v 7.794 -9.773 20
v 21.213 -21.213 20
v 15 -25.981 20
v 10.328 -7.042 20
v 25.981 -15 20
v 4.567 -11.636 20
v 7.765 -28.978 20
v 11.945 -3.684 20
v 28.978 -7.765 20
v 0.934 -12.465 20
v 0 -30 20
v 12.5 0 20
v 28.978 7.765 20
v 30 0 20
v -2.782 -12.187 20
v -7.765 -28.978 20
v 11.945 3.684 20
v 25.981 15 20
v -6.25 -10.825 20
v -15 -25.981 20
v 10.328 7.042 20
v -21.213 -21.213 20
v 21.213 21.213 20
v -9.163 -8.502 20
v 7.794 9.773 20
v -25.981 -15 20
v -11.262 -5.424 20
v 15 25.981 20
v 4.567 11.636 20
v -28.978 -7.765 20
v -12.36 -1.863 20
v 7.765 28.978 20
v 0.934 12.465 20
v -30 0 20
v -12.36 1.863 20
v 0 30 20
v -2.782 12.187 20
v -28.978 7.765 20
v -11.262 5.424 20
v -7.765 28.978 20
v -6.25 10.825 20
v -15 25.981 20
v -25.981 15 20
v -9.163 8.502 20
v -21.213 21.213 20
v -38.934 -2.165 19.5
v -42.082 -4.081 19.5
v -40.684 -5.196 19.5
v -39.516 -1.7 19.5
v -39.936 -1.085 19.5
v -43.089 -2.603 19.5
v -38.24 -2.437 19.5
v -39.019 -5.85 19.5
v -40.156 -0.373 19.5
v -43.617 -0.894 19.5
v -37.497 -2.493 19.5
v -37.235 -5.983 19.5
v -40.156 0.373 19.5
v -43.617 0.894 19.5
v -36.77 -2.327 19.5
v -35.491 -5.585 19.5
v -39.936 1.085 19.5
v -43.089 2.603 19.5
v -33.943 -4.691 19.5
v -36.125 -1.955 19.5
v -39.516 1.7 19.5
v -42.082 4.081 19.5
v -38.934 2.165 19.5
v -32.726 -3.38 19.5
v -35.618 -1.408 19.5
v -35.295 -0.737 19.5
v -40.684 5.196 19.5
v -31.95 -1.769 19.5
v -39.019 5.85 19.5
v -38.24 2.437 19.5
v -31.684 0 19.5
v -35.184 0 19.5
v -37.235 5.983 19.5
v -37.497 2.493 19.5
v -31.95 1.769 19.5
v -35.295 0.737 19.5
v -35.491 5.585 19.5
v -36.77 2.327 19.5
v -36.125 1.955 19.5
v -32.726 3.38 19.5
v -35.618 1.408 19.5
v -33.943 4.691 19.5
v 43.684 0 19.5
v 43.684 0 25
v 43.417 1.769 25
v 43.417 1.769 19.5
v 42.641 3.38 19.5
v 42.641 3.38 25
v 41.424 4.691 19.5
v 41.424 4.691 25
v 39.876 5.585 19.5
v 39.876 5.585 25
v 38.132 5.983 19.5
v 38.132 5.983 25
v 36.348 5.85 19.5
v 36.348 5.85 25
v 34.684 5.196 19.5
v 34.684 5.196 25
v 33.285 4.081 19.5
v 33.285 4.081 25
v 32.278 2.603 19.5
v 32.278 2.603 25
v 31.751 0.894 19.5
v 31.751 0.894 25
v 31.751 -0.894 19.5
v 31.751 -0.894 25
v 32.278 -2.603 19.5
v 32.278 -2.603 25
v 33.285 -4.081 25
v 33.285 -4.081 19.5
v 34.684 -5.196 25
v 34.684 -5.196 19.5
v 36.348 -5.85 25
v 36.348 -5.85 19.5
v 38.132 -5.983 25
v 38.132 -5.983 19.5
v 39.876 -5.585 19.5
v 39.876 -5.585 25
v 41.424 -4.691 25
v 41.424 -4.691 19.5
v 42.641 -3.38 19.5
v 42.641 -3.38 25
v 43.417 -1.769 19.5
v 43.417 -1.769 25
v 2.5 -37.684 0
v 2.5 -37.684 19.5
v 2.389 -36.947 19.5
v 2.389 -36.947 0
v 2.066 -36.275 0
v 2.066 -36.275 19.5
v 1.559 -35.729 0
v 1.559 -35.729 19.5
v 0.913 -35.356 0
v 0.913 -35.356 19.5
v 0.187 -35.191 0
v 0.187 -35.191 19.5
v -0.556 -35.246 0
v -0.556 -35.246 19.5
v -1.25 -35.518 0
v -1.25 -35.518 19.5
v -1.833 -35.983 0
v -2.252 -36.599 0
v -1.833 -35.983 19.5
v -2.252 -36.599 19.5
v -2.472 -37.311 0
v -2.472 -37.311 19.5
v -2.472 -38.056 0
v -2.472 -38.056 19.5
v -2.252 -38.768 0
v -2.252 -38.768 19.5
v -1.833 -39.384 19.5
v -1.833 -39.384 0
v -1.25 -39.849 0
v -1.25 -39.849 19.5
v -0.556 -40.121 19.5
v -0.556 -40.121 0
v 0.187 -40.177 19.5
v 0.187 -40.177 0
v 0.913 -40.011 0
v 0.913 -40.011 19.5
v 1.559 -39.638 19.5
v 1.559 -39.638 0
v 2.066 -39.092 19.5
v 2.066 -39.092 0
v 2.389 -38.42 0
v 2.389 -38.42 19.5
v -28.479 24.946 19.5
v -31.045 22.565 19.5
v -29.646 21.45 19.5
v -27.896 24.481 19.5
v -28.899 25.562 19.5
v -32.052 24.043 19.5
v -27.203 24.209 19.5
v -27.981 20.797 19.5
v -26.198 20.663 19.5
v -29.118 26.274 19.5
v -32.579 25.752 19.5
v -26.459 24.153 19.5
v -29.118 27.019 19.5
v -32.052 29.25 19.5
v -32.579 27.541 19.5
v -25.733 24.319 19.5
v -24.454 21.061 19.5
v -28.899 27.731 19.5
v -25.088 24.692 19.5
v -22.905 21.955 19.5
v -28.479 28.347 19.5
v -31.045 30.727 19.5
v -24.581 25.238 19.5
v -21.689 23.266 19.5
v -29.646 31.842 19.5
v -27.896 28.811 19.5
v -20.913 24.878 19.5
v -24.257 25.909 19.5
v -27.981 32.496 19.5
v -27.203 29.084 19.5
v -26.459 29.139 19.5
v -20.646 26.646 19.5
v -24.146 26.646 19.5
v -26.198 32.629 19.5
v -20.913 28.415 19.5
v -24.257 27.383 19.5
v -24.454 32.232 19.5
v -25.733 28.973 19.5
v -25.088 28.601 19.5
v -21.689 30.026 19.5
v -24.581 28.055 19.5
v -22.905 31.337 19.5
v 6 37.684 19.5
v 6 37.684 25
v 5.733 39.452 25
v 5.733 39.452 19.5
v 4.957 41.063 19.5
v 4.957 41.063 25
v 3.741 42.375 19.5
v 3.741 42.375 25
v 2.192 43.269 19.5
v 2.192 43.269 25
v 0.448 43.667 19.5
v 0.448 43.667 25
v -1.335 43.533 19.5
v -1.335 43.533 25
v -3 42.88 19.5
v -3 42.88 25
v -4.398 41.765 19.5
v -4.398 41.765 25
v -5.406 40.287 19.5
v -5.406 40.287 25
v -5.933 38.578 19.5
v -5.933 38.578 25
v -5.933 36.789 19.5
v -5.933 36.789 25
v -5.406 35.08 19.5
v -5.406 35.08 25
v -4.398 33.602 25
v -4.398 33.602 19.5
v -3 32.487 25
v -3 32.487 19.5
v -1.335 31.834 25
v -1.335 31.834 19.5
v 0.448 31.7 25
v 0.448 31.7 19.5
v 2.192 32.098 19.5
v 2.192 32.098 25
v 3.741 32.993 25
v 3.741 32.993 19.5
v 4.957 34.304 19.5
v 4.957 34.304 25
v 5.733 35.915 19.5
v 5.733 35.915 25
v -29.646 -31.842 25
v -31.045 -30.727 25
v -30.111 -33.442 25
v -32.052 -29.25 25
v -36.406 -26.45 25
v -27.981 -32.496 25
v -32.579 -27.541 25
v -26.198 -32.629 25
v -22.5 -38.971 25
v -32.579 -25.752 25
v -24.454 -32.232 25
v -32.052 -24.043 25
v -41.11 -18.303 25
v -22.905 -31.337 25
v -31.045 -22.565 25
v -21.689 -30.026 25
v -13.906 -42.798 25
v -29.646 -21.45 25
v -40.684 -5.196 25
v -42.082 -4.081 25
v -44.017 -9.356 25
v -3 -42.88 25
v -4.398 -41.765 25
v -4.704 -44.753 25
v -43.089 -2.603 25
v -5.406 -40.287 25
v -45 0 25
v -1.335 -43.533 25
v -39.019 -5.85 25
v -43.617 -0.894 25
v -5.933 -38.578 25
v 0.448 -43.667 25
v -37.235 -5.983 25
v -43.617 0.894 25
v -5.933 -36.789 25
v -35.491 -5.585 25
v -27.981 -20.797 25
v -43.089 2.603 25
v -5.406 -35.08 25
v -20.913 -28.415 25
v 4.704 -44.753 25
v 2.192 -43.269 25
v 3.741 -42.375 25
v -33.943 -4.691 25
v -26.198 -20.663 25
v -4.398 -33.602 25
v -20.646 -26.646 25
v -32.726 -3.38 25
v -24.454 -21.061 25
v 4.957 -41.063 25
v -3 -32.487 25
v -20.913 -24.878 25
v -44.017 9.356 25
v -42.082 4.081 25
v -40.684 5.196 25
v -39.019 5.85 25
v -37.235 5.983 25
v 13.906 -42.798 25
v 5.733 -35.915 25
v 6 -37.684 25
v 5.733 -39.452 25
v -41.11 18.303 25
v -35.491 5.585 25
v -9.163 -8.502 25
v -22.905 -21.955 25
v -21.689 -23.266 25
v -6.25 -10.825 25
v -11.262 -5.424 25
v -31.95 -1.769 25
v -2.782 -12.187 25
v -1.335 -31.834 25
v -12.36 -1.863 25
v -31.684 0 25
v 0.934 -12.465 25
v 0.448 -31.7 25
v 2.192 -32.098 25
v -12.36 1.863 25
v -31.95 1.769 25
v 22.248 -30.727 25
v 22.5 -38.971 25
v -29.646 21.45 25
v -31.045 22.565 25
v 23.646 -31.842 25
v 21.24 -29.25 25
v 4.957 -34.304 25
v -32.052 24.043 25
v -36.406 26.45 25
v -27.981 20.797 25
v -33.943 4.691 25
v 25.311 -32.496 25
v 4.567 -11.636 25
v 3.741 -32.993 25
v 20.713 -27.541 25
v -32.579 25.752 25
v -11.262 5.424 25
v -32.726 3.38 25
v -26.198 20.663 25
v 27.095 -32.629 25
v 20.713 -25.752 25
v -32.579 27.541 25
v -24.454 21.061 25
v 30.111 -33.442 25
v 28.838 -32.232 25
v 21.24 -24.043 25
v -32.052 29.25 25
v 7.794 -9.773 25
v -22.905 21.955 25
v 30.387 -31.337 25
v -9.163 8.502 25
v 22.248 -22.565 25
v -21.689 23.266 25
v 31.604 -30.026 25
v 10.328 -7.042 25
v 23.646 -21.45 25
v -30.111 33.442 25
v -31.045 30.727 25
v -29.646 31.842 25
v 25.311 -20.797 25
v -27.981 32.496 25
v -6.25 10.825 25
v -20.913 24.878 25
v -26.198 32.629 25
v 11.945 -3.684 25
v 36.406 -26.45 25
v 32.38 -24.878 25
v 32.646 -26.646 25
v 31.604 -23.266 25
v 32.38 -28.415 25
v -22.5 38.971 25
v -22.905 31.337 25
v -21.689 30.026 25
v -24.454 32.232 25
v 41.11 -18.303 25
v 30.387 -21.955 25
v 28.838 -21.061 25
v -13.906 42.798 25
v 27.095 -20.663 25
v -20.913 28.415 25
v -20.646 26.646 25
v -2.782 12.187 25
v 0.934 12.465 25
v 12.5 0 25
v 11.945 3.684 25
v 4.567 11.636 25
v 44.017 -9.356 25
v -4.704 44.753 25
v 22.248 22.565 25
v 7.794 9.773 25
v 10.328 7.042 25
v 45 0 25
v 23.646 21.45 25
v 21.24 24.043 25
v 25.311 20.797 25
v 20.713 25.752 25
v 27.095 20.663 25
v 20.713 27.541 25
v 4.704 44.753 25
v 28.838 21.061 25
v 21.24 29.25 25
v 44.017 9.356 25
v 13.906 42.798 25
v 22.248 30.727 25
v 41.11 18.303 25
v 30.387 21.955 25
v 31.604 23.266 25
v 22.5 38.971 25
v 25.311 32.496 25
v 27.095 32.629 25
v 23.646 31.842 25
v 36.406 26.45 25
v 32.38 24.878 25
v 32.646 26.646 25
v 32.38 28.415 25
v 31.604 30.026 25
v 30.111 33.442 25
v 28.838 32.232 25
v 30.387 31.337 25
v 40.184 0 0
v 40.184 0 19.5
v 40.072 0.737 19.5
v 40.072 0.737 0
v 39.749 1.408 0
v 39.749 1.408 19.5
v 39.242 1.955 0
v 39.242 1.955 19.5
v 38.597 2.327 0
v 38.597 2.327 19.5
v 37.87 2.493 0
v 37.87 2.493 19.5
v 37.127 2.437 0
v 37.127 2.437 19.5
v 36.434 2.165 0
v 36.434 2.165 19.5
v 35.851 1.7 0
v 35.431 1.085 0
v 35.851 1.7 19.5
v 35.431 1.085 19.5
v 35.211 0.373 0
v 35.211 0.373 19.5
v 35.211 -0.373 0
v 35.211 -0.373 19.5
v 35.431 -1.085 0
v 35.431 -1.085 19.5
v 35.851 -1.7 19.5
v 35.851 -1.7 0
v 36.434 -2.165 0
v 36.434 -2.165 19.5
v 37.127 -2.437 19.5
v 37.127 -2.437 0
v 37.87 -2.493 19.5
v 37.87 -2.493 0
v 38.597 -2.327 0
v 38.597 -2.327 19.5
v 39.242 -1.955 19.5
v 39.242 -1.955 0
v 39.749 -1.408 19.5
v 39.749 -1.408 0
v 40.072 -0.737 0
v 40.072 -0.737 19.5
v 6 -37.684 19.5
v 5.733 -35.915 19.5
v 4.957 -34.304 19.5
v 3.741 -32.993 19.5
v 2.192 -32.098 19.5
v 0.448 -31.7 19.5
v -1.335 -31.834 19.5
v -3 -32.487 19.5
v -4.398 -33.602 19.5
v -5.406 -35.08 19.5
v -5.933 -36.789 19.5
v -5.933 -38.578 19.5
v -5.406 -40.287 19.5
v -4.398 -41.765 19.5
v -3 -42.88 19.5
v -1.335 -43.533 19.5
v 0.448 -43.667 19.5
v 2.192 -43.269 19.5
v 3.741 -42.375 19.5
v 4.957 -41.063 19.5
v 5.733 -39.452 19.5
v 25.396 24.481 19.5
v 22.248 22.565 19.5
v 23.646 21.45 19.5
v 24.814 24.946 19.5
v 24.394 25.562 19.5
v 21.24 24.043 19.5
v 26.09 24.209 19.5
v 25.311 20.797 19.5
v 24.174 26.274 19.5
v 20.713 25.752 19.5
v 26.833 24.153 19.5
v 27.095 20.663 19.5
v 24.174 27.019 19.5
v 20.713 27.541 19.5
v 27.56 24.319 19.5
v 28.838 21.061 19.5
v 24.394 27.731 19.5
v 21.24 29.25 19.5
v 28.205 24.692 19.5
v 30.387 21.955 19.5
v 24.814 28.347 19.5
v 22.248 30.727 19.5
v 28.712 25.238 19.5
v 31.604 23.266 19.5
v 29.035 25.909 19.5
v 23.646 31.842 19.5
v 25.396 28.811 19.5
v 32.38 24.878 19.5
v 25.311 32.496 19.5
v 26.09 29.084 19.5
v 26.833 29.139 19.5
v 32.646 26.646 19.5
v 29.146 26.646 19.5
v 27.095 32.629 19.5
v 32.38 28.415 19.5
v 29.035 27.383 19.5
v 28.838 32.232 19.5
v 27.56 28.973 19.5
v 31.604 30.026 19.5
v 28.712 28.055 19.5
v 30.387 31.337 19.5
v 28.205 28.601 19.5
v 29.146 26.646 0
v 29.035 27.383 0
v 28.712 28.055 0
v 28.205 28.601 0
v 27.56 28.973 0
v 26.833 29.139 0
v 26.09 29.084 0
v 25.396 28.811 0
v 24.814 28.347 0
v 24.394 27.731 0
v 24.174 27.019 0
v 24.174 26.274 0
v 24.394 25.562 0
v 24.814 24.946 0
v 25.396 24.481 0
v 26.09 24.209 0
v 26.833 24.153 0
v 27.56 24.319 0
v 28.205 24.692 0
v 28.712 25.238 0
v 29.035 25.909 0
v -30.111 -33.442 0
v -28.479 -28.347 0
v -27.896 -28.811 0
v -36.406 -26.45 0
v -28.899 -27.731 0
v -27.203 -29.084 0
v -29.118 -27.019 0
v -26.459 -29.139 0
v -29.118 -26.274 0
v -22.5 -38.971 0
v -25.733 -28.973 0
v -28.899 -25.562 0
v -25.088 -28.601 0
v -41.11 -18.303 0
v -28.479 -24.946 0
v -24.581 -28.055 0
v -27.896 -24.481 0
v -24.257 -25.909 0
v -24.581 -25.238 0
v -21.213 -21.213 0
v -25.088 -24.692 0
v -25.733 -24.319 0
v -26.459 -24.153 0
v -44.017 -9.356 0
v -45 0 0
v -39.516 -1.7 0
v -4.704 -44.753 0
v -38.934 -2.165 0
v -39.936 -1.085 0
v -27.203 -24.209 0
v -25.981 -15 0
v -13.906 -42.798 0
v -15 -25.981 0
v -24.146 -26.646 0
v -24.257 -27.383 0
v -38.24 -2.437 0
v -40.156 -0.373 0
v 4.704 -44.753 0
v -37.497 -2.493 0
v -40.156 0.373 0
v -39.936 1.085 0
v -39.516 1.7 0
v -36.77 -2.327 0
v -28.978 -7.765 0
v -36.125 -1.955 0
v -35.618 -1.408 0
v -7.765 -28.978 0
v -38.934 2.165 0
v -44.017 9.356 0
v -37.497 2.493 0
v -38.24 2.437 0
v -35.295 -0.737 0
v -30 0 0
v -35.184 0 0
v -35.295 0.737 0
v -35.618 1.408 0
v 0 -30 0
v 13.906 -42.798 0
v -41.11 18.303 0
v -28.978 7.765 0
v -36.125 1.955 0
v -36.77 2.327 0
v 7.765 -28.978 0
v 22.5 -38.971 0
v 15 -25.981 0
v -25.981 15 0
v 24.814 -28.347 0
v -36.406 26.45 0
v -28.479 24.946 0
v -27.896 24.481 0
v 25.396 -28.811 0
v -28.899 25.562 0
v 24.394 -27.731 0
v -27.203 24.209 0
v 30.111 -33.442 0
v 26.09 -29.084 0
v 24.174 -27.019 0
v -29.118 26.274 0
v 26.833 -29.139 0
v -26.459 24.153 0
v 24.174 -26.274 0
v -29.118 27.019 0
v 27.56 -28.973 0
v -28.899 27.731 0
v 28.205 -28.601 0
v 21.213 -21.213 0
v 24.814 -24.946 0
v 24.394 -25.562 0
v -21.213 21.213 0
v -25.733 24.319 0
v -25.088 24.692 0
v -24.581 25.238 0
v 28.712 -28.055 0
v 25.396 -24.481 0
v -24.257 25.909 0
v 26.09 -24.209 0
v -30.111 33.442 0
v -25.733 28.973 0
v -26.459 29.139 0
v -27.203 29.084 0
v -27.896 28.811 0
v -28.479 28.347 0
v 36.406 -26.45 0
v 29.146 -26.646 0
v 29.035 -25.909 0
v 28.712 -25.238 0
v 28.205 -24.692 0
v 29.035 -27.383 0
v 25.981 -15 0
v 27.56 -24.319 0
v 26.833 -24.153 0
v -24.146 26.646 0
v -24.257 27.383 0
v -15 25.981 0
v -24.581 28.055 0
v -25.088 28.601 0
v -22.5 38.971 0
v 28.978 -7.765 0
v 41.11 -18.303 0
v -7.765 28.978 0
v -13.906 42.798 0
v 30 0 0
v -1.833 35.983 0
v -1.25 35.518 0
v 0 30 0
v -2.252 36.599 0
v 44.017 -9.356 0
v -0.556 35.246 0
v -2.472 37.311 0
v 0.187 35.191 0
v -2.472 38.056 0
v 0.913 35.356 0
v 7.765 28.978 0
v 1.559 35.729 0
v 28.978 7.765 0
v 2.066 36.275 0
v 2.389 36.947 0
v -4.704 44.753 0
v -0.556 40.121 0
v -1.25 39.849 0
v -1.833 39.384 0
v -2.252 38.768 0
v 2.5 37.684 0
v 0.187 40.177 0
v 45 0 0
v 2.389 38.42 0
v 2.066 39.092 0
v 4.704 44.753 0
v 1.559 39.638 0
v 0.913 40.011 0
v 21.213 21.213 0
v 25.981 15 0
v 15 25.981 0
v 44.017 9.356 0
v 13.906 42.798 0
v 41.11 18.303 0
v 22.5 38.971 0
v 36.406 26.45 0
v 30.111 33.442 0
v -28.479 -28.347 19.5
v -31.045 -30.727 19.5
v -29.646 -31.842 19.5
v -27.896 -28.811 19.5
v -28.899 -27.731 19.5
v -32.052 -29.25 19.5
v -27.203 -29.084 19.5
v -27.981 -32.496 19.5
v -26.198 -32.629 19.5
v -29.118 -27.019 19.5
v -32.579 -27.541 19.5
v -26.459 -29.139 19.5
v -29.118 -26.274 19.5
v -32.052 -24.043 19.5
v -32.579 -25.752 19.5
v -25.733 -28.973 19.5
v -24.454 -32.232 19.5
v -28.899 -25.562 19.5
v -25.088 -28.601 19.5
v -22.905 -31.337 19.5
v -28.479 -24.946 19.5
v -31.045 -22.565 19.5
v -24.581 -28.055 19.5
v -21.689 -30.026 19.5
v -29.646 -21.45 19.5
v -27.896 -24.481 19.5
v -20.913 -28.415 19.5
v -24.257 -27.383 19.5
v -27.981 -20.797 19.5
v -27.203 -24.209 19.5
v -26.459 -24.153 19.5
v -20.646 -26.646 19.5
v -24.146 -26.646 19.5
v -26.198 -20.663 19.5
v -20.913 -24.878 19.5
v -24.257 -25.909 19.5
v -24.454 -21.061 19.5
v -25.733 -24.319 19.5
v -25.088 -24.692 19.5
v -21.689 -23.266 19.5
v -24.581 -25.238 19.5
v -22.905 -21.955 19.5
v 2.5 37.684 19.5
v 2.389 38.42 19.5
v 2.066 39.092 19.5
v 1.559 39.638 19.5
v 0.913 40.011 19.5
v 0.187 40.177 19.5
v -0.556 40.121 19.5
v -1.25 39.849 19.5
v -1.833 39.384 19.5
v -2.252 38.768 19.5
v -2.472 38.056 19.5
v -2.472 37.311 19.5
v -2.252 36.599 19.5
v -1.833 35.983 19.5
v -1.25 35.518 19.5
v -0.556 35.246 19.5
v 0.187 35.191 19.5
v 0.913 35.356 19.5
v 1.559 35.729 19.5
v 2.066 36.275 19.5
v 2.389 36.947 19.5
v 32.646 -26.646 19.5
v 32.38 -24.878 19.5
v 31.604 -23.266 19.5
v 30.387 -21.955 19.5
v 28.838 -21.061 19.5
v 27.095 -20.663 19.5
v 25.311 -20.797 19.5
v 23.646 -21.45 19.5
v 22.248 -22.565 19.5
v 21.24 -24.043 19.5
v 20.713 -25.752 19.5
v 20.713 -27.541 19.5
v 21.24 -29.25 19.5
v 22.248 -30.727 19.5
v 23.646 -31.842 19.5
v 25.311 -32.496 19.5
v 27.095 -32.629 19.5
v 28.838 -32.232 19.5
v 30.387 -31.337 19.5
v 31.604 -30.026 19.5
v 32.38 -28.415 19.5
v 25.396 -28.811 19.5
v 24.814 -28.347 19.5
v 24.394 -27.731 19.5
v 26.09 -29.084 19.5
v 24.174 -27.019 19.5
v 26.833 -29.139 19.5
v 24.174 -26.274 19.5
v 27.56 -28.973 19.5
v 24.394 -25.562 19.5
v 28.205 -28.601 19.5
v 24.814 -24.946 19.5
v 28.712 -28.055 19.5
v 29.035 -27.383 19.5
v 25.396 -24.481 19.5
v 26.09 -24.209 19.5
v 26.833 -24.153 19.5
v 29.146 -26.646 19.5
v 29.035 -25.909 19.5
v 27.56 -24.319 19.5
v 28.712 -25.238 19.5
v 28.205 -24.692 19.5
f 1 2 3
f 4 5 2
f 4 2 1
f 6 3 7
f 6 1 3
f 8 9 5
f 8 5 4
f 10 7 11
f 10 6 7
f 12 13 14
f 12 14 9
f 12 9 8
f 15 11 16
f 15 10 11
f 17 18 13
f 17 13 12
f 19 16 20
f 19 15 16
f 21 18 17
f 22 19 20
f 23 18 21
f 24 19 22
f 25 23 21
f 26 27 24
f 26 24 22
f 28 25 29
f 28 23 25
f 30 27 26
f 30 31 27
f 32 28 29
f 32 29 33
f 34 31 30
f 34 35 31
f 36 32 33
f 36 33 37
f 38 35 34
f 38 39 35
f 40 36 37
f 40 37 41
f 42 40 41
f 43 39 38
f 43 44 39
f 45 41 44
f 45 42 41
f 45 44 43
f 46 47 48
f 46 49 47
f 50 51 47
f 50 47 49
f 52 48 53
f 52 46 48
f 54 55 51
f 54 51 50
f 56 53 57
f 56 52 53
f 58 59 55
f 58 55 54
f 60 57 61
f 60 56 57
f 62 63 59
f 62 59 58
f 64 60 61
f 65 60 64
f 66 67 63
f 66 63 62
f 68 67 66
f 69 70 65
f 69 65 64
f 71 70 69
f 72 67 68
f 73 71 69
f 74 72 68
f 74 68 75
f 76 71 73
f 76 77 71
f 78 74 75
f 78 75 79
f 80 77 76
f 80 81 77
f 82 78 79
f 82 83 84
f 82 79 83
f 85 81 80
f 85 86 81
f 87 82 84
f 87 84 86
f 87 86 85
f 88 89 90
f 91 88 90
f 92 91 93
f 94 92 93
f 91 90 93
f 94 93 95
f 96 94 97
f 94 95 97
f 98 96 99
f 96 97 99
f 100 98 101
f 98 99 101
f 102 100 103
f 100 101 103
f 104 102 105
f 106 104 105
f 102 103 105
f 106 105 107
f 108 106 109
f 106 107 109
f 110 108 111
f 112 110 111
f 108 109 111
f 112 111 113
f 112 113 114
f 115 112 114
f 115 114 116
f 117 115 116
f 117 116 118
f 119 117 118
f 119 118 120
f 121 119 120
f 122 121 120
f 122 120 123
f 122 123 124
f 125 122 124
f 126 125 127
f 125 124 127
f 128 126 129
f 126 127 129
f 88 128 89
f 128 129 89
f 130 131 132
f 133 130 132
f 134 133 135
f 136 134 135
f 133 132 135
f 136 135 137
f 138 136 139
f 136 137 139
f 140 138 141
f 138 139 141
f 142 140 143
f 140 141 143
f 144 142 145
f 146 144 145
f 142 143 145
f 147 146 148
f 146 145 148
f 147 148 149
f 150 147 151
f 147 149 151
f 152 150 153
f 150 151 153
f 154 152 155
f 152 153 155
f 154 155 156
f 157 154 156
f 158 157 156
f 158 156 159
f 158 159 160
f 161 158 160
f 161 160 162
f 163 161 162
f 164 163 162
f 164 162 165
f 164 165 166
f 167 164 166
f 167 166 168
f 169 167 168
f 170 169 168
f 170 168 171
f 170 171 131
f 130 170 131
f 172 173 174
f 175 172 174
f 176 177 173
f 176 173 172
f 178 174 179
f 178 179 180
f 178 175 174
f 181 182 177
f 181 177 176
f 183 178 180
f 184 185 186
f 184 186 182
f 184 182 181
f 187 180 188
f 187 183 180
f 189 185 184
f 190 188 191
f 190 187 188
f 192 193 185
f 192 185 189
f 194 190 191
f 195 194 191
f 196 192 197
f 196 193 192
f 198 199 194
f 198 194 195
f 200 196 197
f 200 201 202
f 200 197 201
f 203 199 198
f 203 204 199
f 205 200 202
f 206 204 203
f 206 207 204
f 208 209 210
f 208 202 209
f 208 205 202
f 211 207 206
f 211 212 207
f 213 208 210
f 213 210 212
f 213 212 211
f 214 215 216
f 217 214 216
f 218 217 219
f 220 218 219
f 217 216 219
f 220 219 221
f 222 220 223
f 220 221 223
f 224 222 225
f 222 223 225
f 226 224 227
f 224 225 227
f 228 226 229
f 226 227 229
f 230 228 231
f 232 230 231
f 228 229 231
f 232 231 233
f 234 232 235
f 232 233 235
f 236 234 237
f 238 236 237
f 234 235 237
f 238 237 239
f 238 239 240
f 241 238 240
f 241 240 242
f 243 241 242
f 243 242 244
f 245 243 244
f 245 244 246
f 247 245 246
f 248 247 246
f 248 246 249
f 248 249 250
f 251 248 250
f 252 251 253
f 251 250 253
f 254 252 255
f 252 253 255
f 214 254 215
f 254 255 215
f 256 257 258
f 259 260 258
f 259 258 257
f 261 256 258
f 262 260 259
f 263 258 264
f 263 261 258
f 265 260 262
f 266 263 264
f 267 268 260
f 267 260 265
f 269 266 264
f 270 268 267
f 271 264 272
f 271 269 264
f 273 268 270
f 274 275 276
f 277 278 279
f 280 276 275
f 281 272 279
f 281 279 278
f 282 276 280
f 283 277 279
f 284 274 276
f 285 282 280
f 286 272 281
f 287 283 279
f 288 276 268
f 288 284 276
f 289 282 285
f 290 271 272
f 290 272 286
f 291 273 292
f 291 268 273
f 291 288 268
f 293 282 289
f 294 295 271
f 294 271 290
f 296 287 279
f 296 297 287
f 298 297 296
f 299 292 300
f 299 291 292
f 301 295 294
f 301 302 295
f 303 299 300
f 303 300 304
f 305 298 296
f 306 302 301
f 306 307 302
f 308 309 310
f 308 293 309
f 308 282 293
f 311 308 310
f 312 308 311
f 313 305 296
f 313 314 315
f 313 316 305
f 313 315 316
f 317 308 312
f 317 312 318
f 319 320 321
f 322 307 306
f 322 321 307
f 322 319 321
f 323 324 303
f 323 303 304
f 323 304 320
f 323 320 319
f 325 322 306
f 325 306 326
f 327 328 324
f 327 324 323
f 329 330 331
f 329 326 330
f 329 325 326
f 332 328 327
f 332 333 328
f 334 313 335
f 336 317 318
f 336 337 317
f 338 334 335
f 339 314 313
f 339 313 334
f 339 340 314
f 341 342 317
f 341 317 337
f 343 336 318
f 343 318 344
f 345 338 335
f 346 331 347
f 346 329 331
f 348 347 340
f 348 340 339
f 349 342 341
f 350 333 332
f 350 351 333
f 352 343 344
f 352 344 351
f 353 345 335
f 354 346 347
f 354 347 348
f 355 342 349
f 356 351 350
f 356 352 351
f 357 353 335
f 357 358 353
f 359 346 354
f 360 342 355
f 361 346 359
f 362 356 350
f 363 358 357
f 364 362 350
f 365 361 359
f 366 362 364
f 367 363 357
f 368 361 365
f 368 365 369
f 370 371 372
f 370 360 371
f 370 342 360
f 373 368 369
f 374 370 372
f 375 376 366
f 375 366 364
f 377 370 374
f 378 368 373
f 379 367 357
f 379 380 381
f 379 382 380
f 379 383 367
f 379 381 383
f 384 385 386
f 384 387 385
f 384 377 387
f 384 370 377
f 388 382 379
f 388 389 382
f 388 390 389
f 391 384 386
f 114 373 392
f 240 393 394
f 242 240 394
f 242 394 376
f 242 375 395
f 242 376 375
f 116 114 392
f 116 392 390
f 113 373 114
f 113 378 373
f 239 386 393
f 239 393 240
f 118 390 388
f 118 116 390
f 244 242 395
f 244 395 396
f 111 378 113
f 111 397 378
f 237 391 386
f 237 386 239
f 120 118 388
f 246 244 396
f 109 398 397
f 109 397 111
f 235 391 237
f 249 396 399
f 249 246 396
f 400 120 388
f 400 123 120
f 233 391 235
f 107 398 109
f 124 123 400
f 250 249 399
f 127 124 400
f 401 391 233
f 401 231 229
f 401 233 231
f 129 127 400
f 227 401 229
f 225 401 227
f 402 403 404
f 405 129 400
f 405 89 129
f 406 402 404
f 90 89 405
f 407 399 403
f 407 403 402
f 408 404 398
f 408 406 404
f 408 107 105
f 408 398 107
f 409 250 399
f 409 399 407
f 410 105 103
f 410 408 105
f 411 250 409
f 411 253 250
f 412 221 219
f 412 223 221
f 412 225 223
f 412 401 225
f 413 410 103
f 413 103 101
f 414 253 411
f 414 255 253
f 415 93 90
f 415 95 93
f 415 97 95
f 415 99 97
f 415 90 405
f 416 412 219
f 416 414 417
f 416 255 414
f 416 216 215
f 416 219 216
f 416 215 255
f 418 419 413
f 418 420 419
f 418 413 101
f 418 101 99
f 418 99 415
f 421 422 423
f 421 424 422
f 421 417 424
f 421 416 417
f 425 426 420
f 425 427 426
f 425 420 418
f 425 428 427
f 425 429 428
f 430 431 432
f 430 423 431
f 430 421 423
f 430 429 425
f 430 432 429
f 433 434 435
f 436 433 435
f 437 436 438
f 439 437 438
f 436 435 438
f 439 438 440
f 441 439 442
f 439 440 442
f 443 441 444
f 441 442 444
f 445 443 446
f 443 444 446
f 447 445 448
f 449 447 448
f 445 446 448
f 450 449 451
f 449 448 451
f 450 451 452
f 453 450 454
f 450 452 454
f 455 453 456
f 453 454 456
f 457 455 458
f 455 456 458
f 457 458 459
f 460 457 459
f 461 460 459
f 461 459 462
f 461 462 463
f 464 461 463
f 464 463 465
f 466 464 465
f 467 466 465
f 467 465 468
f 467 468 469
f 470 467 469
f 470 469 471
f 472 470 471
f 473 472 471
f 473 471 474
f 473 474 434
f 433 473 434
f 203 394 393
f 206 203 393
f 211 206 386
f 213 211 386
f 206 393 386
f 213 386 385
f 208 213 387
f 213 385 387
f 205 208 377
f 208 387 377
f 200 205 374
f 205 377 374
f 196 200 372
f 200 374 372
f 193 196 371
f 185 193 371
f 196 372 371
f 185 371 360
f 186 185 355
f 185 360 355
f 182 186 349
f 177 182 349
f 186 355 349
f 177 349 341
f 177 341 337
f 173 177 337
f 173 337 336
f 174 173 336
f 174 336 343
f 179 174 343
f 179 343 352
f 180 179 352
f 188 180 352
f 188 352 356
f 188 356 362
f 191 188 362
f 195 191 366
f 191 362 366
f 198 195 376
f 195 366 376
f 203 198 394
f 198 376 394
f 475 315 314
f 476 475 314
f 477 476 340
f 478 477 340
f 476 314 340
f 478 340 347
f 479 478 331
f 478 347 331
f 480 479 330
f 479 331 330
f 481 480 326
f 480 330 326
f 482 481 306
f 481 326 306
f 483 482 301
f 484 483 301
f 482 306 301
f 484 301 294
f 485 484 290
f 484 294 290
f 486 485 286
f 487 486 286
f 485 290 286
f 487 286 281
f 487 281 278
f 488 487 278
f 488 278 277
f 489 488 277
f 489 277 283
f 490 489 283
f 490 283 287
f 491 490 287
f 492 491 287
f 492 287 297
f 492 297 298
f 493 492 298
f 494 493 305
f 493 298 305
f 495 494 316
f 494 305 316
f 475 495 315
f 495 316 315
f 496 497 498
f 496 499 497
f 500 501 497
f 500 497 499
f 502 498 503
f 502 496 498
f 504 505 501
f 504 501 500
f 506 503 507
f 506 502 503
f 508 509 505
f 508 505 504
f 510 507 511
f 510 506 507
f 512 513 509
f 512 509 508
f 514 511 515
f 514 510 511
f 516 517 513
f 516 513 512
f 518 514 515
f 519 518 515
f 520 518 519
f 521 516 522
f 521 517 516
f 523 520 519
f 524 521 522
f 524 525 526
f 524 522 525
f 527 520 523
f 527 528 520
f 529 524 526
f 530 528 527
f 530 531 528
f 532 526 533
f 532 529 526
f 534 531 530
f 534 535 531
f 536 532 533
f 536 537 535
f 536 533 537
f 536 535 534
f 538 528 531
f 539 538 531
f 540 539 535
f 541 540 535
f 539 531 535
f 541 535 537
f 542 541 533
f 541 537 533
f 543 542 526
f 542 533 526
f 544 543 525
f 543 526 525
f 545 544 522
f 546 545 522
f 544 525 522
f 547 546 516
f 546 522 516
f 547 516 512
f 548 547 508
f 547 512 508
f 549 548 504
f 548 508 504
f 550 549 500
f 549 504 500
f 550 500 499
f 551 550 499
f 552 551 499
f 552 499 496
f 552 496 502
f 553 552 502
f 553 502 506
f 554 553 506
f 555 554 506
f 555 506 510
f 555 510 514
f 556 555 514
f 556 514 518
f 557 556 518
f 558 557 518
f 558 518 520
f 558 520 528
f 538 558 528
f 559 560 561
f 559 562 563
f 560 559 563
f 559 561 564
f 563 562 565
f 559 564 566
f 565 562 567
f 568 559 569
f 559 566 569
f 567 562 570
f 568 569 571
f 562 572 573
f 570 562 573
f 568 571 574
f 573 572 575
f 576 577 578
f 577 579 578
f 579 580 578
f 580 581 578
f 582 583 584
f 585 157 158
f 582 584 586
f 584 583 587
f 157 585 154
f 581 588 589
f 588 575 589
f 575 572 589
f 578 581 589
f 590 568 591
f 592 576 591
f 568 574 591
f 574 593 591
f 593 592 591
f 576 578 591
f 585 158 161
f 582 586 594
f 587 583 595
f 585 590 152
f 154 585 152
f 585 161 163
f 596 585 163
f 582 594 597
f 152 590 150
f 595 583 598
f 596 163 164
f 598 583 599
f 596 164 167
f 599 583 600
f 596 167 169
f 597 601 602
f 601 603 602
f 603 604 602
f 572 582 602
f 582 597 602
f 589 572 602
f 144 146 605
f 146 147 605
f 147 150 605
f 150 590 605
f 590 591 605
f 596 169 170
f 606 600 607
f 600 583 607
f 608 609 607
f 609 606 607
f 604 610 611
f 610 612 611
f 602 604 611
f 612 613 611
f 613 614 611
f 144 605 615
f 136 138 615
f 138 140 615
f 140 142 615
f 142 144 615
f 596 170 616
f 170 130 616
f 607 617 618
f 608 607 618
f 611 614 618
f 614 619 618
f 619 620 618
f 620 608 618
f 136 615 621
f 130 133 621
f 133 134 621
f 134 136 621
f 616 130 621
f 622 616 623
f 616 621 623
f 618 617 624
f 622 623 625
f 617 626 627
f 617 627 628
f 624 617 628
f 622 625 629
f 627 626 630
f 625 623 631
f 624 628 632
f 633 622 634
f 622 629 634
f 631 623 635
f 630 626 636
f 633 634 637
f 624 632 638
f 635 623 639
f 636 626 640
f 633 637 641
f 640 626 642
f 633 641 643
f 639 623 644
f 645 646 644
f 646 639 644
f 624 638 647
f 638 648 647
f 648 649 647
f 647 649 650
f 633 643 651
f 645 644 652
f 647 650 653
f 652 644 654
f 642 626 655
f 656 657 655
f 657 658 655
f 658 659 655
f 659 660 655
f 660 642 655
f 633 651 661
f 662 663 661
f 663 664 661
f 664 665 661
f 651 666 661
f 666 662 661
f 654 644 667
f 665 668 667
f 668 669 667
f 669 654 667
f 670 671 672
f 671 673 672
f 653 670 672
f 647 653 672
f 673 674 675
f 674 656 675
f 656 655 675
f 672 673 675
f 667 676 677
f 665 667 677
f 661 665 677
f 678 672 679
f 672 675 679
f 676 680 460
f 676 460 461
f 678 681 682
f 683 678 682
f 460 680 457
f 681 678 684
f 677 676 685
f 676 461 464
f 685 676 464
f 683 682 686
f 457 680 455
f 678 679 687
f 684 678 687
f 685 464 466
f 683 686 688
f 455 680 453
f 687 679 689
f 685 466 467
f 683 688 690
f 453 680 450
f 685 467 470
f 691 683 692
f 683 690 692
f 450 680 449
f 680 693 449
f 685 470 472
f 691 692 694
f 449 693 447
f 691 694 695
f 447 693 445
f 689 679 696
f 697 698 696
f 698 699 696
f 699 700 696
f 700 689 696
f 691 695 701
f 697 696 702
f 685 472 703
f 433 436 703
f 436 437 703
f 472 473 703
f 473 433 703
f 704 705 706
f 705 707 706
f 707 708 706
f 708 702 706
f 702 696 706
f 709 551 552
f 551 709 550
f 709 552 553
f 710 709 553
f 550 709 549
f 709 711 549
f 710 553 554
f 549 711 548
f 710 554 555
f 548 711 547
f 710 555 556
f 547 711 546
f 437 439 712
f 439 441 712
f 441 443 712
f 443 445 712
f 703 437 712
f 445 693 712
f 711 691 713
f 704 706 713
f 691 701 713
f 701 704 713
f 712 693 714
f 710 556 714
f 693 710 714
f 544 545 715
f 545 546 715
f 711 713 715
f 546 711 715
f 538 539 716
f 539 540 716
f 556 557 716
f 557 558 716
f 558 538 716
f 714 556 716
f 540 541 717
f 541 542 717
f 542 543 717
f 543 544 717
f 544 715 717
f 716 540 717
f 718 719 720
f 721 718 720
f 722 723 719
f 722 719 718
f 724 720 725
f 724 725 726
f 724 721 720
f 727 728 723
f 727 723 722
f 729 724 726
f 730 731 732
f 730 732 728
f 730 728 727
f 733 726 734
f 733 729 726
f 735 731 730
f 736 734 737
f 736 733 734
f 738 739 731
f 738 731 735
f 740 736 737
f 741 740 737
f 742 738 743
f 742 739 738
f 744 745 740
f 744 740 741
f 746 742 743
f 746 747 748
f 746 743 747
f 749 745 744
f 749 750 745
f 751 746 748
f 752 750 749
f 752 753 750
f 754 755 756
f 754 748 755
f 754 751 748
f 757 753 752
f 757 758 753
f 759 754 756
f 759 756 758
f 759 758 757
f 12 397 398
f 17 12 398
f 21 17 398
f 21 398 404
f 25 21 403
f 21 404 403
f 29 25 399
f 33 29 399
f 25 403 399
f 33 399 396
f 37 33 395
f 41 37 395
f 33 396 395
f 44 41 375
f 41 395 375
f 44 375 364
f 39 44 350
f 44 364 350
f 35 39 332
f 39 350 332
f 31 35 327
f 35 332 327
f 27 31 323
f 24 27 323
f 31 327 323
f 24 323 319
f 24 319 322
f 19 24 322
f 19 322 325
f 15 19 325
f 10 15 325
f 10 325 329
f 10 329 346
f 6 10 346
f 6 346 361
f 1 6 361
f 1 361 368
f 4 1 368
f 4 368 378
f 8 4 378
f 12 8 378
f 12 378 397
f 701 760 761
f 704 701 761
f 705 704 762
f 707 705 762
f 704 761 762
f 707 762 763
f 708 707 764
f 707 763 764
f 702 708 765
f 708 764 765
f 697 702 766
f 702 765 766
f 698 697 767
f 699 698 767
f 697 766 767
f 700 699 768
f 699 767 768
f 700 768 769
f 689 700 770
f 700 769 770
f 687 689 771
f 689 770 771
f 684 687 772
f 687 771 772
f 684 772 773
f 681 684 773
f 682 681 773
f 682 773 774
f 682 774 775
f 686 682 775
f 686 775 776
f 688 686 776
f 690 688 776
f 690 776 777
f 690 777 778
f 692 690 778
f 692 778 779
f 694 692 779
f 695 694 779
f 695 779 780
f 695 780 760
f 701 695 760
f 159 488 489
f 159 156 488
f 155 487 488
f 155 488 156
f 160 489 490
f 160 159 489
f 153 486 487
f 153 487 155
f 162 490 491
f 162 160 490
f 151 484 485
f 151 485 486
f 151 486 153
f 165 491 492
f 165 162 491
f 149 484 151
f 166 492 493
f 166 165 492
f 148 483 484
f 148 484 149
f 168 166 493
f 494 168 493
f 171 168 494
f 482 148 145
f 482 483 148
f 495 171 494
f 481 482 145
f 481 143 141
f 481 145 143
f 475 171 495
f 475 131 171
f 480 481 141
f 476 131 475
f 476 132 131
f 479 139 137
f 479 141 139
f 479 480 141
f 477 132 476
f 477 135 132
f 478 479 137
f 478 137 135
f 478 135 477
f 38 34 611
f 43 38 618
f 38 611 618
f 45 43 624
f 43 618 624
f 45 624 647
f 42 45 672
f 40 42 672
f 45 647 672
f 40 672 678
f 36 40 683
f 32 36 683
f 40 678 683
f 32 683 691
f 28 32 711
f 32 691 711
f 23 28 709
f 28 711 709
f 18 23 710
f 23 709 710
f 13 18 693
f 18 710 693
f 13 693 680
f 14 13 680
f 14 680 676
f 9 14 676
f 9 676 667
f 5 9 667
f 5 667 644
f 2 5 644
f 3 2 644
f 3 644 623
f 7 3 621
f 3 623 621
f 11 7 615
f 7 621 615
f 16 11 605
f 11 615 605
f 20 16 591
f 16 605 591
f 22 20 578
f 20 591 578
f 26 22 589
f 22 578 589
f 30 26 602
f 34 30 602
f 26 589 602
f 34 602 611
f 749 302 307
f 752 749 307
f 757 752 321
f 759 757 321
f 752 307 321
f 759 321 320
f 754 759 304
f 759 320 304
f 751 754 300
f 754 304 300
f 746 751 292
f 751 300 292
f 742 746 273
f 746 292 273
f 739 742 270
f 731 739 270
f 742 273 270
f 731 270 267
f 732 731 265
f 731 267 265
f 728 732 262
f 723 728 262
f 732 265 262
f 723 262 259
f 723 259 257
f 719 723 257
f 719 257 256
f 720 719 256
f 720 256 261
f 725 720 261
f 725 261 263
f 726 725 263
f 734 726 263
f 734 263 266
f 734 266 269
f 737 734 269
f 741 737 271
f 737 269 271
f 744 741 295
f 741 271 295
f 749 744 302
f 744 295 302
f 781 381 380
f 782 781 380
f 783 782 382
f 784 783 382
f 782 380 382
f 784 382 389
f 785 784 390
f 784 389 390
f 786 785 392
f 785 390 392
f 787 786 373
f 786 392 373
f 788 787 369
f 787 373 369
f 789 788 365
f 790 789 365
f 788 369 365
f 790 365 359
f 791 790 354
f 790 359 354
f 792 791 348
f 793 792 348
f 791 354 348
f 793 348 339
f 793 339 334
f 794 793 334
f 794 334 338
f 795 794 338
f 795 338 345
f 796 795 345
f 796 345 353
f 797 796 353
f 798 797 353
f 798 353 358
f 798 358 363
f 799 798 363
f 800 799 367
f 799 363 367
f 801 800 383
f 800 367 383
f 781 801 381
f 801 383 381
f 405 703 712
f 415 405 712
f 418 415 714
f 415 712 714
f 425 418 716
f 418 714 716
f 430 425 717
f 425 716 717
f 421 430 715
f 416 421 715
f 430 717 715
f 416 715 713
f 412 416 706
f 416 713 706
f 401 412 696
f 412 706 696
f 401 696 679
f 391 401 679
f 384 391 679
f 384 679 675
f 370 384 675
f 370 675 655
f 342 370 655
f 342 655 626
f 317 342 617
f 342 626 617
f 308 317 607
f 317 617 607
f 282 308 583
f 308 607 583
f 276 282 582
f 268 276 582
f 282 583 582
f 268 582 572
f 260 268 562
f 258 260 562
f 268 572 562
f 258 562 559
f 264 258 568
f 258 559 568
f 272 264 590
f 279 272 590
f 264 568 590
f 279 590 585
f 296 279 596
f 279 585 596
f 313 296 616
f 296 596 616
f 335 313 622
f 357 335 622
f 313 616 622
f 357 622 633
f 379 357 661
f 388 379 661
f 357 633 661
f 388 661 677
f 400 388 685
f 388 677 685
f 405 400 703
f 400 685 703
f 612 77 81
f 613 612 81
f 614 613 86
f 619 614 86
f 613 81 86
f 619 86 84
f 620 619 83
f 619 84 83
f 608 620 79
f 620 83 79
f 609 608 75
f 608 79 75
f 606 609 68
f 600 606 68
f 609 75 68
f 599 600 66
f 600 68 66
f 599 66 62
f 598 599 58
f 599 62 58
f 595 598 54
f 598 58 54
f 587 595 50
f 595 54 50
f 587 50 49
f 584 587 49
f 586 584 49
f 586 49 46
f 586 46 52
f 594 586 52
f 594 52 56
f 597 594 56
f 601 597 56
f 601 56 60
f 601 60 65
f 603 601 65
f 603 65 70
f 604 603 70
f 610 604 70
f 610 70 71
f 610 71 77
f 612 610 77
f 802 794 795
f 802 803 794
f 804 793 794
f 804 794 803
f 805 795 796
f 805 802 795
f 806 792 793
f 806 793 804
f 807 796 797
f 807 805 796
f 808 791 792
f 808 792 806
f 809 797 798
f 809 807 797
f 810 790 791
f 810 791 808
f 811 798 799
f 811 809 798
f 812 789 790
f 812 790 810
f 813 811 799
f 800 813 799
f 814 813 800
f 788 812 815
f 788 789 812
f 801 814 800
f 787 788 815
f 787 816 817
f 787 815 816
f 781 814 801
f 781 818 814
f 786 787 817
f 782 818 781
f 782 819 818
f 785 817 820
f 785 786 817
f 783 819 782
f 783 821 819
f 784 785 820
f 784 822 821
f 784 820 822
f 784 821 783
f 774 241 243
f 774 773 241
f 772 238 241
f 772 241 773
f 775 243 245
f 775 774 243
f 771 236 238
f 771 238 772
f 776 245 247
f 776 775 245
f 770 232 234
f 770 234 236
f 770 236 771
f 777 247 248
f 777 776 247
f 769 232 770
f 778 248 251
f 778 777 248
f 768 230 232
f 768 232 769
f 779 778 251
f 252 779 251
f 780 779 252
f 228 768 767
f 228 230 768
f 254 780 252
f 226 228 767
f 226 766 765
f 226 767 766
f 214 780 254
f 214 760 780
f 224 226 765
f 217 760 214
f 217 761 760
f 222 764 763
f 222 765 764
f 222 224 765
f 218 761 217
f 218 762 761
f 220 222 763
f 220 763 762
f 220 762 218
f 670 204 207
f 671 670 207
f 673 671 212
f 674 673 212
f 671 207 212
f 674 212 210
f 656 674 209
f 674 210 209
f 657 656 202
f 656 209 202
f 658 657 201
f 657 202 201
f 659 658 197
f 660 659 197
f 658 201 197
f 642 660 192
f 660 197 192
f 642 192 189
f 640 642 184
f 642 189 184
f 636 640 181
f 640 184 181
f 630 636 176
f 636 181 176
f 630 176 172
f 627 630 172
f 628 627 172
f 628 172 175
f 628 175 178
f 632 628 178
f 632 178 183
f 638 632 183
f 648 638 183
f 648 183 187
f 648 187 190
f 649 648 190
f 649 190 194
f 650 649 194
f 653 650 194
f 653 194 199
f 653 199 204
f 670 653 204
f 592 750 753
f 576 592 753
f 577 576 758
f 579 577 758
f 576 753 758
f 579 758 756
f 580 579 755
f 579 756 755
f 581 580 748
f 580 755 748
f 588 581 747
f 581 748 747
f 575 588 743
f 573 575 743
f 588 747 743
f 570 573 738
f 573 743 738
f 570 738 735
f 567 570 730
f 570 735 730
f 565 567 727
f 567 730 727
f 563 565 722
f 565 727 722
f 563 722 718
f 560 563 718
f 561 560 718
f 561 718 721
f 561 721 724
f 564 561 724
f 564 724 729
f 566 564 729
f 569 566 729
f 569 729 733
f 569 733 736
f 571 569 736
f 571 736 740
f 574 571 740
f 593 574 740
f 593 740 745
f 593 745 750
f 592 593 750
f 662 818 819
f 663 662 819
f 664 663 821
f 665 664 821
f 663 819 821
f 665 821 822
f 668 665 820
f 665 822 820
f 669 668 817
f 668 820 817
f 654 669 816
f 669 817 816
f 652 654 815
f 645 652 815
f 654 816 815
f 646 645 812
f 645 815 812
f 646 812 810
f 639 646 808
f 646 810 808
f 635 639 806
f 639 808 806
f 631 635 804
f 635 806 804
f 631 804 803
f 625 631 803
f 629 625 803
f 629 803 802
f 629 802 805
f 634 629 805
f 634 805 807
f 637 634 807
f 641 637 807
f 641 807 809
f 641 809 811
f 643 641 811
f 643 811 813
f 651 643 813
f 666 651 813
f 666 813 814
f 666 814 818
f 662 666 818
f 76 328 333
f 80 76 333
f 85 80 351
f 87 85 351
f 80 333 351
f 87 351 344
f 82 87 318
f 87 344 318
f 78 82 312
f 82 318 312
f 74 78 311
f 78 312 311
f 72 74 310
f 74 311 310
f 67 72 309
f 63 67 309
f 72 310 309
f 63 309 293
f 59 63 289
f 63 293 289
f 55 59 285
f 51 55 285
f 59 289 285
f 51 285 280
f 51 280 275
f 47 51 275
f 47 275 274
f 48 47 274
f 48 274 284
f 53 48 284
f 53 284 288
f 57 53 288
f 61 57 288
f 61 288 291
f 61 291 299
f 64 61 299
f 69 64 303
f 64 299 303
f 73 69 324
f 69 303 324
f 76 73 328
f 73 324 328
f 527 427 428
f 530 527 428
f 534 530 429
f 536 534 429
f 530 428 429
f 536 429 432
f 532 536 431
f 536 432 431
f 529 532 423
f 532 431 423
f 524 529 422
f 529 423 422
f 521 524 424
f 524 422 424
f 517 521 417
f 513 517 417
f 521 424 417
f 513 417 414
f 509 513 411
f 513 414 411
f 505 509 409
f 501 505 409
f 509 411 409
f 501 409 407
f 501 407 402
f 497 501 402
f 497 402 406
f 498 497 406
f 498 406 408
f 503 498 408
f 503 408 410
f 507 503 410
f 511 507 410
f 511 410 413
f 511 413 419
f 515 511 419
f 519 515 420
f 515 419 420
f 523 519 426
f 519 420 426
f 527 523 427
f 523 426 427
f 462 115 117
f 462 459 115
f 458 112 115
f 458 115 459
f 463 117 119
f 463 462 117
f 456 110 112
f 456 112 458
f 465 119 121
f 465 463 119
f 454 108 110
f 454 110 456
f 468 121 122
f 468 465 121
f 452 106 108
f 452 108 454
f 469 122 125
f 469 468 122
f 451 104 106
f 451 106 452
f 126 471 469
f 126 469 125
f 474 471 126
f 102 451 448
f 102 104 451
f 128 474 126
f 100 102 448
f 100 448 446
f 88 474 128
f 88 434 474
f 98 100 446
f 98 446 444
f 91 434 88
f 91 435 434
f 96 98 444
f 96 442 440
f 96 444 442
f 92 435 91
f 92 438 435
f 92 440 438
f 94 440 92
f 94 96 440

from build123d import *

# Parameters (mm, degrees)
SKETCH_1_R          = 45
EXTRUDE_1_DEPTH     = 25
SKETCH_2_R          = 12.5
CUT_EXTRUDE_2_DEPTH = 69.373971656
SKETCH_3_R          = 30
CUT_EXTRUDE_3_DEPTH = 20
SKETCH_4_R          = 2.5
CUT_EXTRUDE_4_DEPTH = 69.373971656
SKETCH_6_R          = 6
CUT_EXTRUDE_5_DEPTH = 5.5


with BuildPart() as part:
    # Эскиз1 → Вытянуть1 (new body)
    with BuildSketch(Plane.XY):
        Circle(SKETCH_1_R)
    extrude(amount=EXTRUDE_1_DEPTH)

    # Эскиз2 → Вытянуть2 (cut, through all)
    with BuildSketch(Plane.XY.offset(25)):
        Circle(SKETCH_2_R)
    extrude(amount=-CUT_EXTRUDE_2_DEPTH, mode=Mode.SUBTRACT)

    # Эскиз3 → Вытянуть3 (cut)
    with BuildSketch(Plane(origin=(0, 0, 0), x_dir=(-1, 0, 0), z_dir=(0, 0, -1))):
        Circle(SKETCH_3_R)
    extrude(amount=-CUT_EXTRUDE_3_DEPTH, mode=Mode.SUBTRACT)

    # Эскиз4 → Вытянуть4 (cut, through all)
    with BuildSketch(Plane.XY.offset(25)):
        with Locations((0, 37.683516186)):
            Circle(SKETCH_4_R)
        with Locations((26.646269834, 26.646269834)):
            Circle(SKETCH_4_R)
        with Locations((37.683516186, 0)):
            Circle(SKETCH_4_R)
        with Locations((26.646269834, -26.646269834)):
            Circle(SKETCH_4_R)
        with Locations((0, -37.683516186)):
            Circle(SKETCH_4_R)
        with Locations((-26.646269834, -26.646269834)):
            Circle(SKETCH_4_R)
        with Locations((-37.683516186, 0)):
            Circle(SKETCH_4_R)
        with Locations((-26.646269834, 26.646269834)):
            Circle(SKETCH_4_R)
    extrude(amount=-CUT_EXTRUDE_4_DEPTH, mode=Mode.SUBTRACT)

    # Эскиз6 → Вытянуть5 (cut)
    with BuildSketch(Plane.XY.offset(25)):
        with Locations((0, 37.683516186)):
            Circle(SKETCH_6_R)
        with Locations((26.646269834, 26.646269834)):
            Circle(SKETCH_6_R)
        with Locations((37.683516186, 0)):
            Circle(SKETCH_6_R)
        with Locations((26.646269834, -26.646269834)):
            Circle(SKETCH_6_R)
        with Locations((0, -37.683516186)):
            Circle(SKETCH_6_R)
        with Locations((-26.646269834, -26.646269834)):
            Circle(SKETCH_6_R)
        with Locations((-37.683516186, 0)):
            Circle(SKETCH_6_R)
        with Locations((-26.646269834, 26.646269834)):
            Circle(SKETCH_6_R)
    extrude(amount=-CUT_EXTRUDE_5_DEPTH, mode=Mode.SUBTRACT)


solid = part.part
